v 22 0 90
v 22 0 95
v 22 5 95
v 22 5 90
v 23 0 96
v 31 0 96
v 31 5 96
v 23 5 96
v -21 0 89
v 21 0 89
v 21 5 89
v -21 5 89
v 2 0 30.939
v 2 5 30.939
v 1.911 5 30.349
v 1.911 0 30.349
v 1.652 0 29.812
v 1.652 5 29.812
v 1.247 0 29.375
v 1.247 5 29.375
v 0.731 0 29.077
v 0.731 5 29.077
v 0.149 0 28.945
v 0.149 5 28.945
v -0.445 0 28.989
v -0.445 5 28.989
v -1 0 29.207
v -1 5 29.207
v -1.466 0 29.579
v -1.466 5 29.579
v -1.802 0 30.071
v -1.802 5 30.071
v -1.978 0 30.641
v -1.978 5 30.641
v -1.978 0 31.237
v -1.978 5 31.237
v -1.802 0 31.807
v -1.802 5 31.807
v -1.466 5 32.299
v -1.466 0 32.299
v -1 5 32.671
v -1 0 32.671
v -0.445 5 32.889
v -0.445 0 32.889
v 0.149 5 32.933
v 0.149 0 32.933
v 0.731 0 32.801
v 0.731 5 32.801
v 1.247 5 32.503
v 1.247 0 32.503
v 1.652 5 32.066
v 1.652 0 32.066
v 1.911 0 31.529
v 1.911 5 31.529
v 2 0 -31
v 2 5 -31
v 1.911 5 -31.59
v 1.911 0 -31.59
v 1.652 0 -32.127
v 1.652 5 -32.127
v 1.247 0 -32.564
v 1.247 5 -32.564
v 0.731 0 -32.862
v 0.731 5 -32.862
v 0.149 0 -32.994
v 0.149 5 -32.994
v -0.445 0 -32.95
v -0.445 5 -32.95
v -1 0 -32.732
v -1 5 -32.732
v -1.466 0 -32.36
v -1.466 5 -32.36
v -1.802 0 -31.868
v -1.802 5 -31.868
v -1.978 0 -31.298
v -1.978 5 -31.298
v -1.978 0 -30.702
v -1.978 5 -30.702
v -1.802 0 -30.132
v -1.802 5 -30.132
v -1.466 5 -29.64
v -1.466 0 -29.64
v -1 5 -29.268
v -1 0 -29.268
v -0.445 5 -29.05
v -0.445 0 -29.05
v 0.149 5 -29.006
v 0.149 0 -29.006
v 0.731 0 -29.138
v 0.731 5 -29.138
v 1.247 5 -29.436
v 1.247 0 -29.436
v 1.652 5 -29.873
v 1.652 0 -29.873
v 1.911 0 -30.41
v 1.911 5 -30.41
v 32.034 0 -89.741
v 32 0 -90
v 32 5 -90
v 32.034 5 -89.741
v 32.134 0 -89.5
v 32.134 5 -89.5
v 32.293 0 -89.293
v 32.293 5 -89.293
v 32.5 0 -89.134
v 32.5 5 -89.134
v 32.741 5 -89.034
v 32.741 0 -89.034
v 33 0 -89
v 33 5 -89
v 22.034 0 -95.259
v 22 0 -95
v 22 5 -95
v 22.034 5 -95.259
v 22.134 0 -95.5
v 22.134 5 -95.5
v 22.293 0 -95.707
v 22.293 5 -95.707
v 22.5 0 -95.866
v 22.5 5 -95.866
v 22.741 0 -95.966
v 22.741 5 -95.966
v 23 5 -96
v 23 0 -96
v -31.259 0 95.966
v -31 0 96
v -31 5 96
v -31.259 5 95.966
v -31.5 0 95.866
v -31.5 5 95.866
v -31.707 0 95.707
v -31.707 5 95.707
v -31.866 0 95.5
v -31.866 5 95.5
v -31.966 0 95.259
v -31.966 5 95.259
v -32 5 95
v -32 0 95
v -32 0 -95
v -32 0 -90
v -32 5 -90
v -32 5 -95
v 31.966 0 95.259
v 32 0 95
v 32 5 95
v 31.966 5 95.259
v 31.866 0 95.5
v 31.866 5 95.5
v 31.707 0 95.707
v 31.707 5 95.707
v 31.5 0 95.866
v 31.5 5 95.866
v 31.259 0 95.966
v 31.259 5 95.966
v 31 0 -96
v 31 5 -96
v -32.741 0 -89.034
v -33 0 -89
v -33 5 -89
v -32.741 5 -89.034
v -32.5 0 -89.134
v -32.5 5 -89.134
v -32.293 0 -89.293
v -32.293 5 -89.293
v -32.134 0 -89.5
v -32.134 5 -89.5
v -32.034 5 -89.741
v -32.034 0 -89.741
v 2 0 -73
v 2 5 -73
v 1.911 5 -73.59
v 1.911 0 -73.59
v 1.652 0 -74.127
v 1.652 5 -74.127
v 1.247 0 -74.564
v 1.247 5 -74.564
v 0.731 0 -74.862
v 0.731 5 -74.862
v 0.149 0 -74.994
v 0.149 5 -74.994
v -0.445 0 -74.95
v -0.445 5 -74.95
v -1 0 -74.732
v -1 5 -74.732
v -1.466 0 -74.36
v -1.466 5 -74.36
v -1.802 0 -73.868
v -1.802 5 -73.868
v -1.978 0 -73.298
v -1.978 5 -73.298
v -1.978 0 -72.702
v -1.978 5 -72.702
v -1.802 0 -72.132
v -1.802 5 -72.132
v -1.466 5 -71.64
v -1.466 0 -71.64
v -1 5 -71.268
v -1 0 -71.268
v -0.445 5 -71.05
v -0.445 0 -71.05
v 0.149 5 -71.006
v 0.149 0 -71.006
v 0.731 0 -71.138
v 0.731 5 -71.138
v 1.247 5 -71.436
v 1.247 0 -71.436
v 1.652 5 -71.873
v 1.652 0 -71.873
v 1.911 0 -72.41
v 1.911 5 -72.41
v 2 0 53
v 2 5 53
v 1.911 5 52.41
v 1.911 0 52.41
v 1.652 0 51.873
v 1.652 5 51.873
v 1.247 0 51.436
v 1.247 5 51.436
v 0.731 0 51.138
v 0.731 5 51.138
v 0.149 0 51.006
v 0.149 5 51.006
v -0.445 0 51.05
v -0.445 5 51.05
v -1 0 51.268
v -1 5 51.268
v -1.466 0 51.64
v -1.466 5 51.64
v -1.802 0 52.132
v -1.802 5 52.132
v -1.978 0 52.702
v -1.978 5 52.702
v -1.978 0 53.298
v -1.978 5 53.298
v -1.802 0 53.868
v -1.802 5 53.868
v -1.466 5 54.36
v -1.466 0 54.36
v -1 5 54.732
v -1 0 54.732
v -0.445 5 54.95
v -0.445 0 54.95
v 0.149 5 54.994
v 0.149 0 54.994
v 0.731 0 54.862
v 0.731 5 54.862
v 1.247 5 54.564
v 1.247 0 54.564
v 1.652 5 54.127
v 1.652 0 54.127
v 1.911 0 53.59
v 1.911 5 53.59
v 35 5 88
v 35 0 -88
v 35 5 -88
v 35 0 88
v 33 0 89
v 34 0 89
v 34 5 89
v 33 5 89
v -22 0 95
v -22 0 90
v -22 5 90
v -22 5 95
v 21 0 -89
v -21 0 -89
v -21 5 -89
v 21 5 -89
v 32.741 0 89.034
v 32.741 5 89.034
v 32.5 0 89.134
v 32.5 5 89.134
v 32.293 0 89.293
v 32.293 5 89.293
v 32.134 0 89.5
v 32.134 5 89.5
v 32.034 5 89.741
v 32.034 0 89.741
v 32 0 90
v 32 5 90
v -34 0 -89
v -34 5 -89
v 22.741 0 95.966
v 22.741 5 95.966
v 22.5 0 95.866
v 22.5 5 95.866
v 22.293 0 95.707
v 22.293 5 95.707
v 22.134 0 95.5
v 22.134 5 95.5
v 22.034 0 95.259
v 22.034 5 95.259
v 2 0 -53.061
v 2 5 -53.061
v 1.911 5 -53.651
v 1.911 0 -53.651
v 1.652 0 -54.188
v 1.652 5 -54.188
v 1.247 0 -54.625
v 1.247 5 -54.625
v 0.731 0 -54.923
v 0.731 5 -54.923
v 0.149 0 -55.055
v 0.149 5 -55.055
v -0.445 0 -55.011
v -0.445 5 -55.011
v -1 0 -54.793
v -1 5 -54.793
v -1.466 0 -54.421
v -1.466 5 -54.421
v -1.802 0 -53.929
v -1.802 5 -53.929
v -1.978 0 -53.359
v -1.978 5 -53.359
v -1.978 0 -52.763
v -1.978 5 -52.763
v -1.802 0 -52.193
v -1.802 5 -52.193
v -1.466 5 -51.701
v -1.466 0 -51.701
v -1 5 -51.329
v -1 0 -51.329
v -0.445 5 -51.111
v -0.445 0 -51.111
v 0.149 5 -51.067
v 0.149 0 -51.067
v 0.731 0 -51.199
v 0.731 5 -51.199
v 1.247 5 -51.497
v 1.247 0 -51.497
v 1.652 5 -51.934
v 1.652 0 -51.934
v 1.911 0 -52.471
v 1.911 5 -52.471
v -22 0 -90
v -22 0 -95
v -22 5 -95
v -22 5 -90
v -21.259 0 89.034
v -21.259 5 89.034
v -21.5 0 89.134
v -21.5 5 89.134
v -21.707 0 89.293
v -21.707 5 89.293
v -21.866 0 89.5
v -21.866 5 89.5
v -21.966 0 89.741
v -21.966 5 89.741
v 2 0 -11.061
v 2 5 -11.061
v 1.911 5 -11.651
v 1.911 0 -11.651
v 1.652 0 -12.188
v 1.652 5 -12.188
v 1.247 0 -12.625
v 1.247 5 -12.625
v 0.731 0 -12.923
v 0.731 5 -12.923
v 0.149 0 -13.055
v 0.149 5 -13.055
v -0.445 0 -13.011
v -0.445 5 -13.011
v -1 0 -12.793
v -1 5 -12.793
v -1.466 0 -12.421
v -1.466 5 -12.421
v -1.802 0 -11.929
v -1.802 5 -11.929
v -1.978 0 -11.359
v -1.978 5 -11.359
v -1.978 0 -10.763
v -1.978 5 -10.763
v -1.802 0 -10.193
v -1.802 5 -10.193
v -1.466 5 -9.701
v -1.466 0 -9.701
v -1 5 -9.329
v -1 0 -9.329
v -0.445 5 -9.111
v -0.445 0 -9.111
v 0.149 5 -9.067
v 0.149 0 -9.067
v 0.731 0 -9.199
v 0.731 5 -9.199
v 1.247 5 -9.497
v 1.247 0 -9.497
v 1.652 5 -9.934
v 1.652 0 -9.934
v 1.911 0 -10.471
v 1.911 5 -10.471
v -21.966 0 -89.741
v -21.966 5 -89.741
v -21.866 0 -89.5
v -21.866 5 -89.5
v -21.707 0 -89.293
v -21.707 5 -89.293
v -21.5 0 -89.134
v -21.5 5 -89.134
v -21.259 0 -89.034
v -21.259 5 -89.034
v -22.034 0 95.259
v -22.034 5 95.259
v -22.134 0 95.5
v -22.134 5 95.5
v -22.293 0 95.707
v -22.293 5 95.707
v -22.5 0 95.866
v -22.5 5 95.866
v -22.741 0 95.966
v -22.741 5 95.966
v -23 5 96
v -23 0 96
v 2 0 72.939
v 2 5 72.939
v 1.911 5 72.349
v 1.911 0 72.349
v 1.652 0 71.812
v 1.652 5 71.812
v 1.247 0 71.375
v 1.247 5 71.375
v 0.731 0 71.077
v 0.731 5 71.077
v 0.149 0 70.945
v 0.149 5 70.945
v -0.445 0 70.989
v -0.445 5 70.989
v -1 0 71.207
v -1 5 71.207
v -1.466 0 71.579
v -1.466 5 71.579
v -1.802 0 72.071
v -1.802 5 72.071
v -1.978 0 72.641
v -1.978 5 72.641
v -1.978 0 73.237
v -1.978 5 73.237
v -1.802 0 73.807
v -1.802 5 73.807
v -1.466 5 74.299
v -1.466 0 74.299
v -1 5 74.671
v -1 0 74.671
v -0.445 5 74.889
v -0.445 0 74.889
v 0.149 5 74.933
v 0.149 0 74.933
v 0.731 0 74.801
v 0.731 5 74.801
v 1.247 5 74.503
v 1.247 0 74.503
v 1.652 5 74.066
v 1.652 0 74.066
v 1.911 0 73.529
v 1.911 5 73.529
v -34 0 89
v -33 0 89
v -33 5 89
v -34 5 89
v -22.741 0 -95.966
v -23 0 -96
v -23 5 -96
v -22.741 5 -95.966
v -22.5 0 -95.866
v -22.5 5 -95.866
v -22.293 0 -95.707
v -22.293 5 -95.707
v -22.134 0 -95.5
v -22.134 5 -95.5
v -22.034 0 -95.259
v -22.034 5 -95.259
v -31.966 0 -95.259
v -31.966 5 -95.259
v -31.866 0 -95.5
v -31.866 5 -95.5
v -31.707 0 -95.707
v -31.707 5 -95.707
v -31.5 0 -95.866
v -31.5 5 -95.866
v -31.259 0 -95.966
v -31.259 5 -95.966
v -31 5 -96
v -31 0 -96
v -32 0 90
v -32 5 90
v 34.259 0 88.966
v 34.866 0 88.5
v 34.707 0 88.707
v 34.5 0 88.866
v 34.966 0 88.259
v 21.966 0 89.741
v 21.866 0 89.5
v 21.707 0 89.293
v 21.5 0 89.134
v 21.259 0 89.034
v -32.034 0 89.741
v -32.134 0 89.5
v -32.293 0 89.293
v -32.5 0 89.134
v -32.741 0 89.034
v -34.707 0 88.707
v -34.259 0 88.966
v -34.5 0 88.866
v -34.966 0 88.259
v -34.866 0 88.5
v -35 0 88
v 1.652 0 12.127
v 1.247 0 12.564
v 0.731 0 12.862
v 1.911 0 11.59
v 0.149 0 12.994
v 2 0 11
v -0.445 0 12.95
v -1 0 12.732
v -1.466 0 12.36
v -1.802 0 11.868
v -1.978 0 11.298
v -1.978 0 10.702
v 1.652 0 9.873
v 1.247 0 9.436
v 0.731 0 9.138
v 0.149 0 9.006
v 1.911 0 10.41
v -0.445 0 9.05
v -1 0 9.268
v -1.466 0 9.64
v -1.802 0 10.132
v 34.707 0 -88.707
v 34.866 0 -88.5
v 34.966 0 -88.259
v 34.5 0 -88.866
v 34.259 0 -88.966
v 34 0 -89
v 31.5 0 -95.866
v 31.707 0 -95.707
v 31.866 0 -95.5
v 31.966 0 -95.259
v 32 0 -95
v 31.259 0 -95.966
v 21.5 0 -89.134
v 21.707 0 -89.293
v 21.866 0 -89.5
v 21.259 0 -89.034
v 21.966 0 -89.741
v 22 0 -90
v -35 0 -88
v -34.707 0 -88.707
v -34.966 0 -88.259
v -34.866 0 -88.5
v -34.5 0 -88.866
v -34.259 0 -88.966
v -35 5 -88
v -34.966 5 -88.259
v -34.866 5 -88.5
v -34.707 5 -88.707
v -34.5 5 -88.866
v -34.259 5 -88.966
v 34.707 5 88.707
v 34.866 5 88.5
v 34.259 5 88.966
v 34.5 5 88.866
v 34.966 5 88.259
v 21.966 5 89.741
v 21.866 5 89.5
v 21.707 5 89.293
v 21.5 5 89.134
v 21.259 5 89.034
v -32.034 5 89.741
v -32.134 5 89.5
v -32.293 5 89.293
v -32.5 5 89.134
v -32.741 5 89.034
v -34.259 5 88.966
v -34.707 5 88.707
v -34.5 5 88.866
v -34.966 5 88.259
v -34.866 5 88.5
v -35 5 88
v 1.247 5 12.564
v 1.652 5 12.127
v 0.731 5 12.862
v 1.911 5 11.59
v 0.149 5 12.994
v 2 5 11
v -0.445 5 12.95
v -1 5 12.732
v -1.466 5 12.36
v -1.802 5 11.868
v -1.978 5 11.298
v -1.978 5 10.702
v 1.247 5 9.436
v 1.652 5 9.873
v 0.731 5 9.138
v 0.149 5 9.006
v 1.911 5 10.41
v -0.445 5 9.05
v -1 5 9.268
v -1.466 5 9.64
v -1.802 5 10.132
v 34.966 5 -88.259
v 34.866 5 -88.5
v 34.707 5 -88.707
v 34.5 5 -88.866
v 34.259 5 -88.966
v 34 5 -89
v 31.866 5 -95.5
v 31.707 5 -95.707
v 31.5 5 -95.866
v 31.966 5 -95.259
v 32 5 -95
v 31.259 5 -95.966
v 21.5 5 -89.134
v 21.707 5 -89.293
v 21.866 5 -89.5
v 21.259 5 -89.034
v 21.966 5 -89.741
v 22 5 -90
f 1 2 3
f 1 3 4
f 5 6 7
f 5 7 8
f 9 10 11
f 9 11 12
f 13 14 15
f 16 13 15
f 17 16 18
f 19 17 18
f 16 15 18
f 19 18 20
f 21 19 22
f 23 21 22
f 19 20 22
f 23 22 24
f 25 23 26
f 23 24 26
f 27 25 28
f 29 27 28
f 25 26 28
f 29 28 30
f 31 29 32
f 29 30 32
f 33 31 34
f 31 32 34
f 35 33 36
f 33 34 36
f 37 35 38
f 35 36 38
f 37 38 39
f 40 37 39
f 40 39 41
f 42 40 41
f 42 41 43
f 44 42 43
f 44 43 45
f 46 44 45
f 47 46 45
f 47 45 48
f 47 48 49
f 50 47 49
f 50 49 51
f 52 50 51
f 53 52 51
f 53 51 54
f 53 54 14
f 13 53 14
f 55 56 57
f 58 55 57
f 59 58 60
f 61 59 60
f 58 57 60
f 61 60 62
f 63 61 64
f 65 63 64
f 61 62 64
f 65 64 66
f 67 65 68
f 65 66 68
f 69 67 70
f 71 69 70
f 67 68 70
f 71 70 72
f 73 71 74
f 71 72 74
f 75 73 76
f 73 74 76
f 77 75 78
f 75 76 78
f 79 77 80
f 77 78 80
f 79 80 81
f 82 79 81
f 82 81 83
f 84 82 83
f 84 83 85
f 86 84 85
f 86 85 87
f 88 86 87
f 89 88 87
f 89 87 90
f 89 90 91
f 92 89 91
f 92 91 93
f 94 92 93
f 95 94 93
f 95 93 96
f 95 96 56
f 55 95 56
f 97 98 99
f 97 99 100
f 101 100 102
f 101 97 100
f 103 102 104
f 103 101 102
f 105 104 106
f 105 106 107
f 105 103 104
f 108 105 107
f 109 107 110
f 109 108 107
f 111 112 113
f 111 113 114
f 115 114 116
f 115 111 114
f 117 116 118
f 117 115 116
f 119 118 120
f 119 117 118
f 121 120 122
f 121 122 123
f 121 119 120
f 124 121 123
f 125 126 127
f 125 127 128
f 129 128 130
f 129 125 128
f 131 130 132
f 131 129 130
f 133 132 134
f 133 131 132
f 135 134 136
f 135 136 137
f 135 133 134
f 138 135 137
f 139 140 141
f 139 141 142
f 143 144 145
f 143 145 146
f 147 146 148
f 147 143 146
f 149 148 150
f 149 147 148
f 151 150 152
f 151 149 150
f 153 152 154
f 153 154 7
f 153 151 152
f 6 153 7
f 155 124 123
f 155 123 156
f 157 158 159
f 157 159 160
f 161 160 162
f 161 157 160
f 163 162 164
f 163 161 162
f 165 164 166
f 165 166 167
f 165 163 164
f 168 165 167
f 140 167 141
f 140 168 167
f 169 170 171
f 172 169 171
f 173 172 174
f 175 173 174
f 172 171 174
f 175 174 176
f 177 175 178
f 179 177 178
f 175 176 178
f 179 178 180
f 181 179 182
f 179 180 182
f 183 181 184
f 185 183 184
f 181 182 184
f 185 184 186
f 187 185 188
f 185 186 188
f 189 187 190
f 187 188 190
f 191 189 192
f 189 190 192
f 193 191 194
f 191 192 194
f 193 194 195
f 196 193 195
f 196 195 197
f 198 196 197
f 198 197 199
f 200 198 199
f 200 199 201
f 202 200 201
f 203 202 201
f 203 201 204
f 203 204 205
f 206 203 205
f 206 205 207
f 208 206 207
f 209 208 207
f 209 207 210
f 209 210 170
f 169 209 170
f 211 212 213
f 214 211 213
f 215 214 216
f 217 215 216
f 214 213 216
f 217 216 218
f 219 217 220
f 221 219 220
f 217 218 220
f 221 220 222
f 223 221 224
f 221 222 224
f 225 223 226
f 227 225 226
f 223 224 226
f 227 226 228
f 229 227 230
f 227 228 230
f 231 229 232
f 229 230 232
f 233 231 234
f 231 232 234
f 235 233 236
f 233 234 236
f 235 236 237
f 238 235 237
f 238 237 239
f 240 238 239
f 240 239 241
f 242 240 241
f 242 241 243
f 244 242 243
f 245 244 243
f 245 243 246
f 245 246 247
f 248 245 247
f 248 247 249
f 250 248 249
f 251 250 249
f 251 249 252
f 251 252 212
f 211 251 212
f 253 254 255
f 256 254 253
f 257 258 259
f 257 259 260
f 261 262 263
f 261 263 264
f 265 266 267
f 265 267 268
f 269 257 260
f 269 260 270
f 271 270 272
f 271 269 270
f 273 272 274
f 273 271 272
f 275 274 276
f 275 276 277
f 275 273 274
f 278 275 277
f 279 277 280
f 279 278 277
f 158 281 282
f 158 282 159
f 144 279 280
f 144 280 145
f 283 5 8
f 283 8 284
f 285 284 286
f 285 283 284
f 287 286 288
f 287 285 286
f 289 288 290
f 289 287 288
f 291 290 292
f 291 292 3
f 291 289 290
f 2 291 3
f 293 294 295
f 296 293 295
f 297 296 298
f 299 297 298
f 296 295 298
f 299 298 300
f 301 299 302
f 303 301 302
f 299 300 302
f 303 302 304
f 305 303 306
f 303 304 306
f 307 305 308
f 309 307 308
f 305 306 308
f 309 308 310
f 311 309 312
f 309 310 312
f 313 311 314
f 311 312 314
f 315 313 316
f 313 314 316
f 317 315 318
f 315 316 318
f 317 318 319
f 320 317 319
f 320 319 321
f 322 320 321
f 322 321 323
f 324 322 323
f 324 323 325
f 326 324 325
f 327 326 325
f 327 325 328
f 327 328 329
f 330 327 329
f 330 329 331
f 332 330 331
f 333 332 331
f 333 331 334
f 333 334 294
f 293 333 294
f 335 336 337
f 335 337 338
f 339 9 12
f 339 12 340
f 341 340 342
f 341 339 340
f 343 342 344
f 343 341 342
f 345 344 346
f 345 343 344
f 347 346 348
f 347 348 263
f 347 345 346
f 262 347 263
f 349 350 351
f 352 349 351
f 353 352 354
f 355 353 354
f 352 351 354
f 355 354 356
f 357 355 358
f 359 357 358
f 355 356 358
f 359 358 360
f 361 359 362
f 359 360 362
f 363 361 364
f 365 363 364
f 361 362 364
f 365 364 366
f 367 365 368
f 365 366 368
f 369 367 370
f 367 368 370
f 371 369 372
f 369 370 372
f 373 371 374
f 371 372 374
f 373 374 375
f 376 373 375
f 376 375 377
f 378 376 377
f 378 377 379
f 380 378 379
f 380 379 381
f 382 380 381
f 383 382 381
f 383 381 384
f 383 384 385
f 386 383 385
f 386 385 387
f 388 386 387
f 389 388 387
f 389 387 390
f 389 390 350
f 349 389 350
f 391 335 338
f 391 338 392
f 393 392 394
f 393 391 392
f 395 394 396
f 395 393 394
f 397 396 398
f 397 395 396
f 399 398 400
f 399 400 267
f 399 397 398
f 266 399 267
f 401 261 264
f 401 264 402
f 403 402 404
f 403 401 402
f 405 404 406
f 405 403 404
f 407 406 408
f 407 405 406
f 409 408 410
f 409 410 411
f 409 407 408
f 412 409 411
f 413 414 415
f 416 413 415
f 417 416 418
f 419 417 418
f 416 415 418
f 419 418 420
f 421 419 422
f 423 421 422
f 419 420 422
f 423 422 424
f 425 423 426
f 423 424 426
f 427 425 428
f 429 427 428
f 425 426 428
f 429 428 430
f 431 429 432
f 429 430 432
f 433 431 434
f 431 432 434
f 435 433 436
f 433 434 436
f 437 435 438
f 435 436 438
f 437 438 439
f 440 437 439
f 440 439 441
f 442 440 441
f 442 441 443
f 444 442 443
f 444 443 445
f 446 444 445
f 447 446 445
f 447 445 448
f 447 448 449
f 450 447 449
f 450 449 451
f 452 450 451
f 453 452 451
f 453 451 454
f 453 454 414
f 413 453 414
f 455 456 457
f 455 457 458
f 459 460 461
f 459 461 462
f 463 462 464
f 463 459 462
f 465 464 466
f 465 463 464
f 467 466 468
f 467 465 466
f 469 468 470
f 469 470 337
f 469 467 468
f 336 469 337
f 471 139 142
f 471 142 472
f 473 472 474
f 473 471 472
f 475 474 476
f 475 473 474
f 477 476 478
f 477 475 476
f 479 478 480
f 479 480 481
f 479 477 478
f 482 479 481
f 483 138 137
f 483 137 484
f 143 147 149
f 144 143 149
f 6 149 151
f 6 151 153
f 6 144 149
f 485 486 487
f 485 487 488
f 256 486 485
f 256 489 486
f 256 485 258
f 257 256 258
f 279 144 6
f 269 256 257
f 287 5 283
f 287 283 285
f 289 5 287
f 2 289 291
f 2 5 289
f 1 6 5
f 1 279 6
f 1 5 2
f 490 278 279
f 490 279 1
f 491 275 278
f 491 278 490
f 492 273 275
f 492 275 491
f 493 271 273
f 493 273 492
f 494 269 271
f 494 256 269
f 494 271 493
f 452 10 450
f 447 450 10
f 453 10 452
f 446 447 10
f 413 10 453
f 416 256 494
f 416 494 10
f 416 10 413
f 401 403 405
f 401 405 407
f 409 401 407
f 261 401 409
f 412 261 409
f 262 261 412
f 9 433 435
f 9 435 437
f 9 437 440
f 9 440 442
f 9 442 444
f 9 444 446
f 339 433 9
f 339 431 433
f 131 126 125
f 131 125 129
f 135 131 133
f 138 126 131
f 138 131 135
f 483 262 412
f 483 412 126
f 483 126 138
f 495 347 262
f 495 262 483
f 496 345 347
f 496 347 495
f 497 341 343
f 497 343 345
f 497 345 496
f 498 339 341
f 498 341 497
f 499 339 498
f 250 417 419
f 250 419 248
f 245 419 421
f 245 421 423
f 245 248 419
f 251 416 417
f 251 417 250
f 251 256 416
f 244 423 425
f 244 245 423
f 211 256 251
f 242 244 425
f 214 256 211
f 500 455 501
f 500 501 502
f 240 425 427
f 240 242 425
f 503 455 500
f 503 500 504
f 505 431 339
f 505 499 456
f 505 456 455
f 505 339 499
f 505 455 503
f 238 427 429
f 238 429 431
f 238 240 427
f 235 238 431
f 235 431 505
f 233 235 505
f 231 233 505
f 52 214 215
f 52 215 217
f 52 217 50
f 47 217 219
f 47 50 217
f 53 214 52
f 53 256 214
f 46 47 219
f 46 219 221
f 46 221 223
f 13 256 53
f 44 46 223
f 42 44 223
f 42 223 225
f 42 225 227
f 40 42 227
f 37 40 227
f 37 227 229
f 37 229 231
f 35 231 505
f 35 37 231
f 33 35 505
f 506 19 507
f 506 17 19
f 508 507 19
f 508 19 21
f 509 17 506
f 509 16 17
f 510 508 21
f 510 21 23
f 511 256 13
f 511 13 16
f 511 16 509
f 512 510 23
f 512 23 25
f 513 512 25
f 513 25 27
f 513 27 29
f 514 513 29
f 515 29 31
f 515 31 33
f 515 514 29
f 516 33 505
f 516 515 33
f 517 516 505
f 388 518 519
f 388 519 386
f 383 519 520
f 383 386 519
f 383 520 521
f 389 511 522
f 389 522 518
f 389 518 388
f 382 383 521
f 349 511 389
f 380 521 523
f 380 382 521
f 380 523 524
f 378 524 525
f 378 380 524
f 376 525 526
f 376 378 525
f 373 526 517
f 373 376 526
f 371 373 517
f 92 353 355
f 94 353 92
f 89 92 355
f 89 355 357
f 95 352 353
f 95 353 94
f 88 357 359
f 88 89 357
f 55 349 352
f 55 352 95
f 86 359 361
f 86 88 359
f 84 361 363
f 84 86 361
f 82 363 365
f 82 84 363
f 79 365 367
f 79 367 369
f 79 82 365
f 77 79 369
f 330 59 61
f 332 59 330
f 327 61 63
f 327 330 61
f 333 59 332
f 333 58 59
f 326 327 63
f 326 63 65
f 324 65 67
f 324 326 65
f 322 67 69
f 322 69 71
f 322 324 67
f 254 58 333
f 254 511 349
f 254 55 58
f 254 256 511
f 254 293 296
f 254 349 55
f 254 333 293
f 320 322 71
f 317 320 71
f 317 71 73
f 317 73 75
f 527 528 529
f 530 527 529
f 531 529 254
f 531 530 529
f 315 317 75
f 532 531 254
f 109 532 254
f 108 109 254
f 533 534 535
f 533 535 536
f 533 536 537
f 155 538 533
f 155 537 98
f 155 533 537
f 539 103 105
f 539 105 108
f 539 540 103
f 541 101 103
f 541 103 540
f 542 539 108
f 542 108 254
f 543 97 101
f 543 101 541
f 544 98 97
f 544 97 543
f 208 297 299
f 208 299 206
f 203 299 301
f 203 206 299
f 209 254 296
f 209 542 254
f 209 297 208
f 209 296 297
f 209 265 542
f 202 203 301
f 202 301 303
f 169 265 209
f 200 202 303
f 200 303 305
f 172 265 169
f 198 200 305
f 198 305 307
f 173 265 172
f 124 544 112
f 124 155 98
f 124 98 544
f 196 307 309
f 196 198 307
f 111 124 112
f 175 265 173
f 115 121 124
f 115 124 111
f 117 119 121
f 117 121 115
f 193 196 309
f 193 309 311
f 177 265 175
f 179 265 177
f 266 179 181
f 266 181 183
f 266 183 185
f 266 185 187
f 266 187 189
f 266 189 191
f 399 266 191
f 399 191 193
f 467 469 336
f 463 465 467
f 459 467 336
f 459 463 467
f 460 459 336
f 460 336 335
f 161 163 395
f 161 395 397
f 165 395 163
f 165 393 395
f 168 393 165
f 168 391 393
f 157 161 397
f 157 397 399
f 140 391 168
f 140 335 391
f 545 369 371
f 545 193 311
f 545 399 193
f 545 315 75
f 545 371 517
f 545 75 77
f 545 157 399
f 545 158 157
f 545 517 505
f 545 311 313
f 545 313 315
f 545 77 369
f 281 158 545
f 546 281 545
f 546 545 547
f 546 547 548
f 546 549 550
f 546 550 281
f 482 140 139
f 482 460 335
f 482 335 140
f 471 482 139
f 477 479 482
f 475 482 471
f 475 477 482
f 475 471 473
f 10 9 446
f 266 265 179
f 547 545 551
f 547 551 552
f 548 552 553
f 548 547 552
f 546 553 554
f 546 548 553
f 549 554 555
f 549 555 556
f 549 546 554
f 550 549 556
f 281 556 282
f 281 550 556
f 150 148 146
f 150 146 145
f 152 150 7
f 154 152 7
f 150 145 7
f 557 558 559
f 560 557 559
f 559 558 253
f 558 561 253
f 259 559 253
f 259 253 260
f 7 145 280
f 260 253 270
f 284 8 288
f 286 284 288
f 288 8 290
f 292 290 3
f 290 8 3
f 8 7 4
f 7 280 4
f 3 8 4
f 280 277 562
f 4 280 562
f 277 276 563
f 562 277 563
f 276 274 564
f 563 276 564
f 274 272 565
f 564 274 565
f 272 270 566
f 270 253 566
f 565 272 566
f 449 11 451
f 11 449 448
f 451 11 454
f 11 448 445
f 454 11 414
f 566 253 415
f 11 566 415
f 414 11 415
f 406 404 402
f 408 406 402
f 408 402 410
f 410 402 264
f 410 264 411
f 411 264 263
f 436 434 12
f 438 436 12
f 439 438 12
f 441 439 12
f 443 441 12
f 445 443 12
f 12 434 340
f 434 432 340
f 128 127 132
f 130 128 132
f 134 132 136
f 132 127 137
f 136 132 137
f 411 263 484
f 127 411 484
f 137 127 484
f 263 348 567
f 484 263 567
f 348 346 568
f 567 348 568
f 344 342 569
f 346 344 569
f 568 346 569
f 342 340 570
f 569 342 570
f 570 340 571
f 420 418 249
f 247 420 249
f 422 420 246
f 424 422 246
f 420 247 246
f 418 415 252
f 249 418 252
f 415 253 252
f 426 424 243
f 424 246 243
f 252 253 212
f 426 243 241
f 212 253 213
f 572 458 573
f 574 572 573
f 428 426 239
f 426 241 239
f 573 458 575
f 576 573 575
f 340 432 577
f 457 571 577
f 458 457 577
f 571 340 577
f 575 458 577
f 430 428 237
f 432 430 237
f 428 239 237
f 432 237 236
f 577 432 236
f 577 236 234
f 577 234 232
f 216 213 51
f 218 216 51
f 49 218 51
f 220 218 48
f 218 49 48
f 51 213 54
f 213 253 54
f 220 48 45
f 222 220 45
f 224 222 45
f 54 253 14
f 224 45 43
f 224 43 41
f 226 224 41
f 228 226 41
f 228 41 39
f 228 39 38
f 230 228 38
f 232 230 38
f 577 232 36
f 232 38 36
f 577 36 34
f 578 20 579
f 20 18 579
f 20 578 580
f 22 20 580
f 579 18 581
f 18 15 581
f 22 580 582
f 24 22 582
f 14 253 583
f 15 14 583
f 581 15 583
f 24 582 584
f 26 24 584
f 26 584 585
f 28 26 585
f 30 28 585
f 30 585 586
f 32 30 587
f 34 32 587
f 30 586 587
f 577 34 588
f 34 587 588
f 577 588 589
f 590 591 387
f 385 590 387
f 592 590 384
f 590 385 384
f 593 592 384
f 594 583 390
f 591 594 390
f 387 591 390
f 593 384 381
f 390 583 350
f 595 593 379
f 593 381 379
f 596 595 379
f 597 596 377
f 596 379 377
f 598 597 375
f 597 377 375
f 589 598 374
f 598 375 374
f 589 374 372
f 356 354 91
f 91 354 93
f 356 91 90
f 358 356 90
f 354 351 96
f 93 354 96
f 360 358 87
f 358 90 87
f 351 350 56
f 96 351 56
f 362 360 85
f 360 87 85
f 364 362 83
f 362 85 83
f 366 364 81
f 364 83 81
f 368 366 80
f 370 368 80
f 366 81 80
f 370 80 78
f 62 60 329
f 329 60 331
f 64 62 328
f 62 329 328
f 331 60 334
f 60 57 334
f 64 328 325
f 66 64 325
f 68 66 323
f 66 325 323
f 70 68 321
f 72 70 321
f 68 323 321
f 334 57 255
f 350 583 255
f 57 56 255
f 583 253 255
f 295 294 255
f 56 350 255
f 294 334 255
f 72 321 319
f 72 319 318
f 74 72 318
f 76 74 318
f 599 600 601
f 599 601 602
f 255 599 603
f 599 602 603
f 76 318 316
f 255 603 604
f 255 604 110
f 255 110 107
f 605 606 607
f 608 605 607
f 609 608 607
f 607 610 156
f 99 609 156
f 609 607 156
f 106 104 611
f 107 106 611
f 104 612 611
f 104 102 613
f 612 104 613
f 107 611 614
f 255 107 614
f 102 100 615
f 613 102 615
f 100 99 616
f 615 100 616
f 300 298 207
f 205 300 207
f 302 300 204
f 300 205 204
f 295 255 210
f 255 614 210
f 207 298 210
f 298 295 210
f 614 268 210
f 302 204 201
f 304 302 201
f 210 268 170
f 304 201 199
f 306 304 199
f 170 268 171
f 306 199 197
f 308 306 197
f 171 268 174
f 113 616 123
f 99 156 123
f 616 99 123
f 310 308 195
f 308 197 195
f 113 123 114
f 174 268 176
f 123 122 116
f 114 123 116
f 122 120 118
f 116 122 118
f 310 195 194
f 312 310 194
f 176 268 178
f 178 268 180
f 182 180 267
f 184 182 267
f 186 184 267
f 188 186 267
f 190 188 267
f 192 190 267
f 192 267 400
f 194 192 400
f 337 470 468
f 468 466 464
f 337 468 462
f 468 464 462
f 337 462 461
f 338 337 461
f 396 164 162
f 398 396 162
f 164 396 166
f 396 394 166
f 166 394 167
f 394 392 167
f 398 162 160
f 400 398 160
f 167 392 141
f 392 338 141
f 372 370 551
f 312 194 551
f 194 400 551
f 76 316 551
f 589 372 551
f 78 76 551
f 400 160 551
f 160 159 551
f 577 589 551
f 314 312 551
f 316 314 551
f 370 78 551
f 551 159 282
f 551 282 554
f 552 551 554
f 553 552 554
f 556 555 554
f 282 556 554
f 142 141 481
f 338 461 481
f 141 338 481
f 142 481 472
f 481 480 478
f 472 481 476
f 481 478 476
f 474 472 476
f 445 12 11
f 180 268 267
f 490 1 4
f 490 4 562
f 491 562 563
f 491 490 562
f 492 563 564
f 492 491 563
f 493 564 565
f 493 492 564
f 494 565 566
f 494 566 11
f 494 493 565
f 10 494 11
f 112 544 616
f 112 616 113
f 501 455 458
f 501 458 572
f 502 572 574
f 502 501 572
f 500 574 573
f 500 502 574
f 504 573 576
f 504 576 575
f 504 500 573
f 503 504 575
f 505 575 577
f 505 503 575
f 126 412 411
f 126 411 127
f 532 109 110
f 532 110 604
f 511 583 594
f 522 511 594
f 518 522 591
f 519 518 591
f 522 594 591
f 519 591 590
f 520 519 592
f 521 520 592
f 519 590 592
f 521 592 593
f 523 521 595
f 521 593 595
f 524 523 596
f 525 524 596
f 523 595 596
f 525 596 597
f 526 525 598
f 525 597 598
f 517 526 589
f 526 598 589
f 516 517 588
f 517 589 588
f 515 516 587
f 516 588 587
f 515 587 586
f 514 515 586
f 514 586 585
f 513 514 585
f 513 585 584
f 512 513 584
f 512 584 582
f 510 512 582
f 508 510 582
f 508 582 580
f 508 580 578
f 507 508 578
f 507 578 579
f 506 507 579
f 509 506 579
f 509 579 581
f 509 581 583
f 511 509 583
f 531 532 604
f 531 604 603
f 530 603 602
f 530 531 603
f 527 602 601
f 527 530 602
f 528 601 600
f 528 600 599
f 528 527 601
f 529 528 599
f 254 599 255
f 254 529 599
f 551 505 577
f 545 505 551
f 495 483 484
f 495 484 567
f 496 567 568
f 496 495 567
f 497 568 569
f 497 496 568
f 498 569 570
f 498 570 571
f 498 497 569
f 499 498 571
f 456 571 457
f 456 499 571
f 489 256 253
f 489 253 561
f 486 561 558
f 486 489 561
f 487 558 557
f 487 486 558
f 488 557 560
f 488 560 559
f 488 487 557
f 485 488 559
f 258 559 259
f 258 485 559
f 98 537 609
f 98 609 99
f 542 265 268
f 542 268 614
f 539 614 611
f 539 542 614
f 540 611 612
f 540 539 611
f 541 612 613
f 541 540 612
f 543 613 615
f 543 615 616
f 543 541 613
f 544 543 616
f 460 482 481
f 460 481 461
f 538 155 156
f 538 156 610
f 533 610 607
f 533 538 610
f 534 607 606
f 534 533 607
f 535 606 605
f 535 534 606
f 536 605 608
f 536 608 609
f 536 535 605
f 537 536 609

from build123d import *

# Parameters (mm, degrees)
BOSS_EXTRUDE1_DEPTH = 5
SKETCH2_R           = 2
CUT_EXTRUDE1_DEPTH  = 10


with BuildPart() as part:
    # Sketch1 → Boss-Extrude1 (new body)
    with BuildSketch(Plane(origin=(0, 0, 0), x_dir=(1, 0, 0), z_dir=(0, 1, 0))):
        with BuildLine():
            Line((34, -89), (33, -89))
            ThreePointArc((33, -89), (32.292893219, -89.292893219), (32, -90))
            Line((32, -90), (32, -95))
            ThreePointArc((32, -95), (31.707106781, -95.707106781), (31, -96))
            Line((31, -96), (23, -96))
            ThreePointArc((23, -96), (22.292893219, -95.707106781), (22, -95))
            Line((22, -95), (22, -90))
            ThreePointArc((22, -90), (21.707106781, -89.292893219), (21, -89))
            Line((21, -89), (-21, -89))
            ThreePointArc((-21, -89), (-21.707106781, -89.292893219), (-22, -90))
            Line((-22, -90), (-22, -95))
            ThreePointArc((-22, -95), (-22.292893219, -95.707106781), (-23, -96))
            Line((-23, -96), (-31, -96))
            ThreePointArc((-31, -96), (-31.707106781, -95.707106781), (-32, -95))
            Line((-32, -95), (-32, -90))
            ThreePointArc((-32, -90), (-32.292893219, -89.292893219), (-33, -89))
            Line((-33, -89), (-34, -89))
            ThreePointArc((-34, -89), (-34.707106781, -88.707106781), (-35, -88))
            Line((-35, -88), (-35, 88))
            ThreePointArc((-35, 88), (-34.707106781, 88.707106781), (-34, 89))
            Line((-34, 89), (-33, 89))
            ThreePointArc((-33, 89), (-32.292893219, 89.292893219), (-32, 90))
            Line((-32, 90), (-32, 95))
            ThreePointArc((-32, 95), (-31.707106781, 95.707106781), (-31, 96))
            Line((-31, 96), (-23, 96))
            ThreePointArc((-23, 96), (-22.292893219, 95.707106781), (-22, 95))
            Line((-22, 95), (-22, 90))
            ThreePointArc((-22, 90), (-21.707106781, 89.292893219), (-21, 89))
            Line((-21, 89), (21, 89))
            ThreePointArc((21, 89), (21.707106781, 89.292893219), (22, 90))
            Line((22, 90), (22, 95))
            ThreePointArc((22, 95), (22.292893219, 95.707106781), (23, 96))
            Line((23, 96), (31, 96))
            ThreePointArc((31, 96), (31.707106781, 95.707106781), (32, 95))
            Line((32, 95), (32, 90))
            ThreePointArc((32, 90), (32.292893219, 89.292893219), (33, 89))
            Line((33, 89), (34, 89))
            ThreePointArc((34, 89), (34.707106781, 88.707106781), (35, 88))
            Line((35, 88), (35, -88))
            ThreePointArc((35, -88), (34.707106781, -88.707106781), (34, -89))
        make_face()
    extrude(amount=BOSS_EXTRUDE1_DEPTH)

    # Sketch2 → Cut-Extrude1 (cut)
    with BuildSketch(Plane(origin=(0, 5, 0), x_dir=(1, 0, 0), z_dir=(0, 1, 0))):
        with Locations((0, 73)):
            Circle(SKETCH2_R)
        with Locations((0, 53.061)):
            Circle(SKETCH2_R)
        with Locations((0, 11.061)):
            Circle(SKETCH2_R)
        with Locations((0, 31)):
            Circle(SKETCH2_R)
        with Locations((0, -30.939)):
            Circle(SKETCH2_R)
        with Locations((0, -11)):
            Circle(SKETCH2_R)
        with Locations((0, -72.939)):
            Circle(SKETCH2_R)
        with Locations((0, -53)):
            Circle(SKETCH2_R)
    extrude(amount=-CUT_EXTRUDE1_DEPTH, mode=Mode.SUBTRACT)


solid = part.part
